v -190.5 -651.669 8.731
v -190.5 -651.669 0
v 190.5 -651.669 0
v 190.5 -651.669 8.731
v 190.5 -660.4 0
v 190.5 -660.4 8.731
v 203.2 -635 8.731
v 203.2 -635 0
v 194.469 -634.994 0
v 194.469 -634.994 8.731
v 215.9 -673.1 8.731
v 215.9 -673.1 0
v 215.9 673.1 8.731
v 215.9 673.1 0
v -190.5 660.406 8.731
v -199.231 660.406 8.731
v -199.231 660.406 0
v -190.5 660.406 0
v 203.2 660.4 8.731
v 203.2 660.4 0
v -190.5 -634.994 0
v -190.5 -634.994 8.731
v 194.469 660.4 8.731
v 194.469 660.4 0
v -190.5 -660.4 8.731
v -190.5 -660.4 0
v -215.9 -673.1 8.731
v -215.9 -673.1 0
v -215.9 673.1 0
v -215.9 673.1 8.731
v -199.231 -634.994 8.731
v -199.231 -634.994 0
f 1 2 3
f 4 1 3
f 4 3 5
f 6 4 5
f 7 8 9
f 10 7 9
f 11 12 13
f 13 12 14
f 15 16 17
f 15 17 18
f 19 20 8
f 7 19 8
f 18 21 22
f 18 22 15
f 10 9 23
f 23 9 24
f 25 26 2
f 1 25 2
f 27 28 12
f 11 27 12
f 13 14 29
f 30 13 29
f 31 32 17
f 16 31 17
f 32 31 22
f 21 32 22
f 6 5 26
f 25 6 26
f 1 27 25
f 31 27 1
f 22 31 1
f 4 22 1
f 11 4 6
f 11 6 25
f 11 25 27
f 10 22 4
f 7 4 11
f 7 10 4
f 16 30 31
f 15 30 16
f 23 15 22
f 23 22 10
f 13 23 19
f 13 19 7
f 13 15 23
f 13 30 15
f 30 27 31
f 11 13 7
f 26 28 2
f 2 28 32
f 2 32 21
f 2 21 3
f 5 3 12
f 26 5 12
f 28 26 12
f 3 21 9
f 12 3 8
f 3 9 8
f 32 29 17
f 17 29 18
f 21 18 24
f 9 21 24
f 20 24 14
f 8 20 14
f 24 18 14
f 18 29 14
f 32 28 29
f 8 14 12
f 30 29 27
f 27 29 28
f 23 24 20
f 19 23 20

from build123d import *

# Parameters (mm, degrees)
F0_W     = 8.73125
F0_H     = 1295.4
F1_DEPTH = 8.73125


with BuildPart() as f1:
    # F0 (on Top) → F1 (new body)
    with BuildSketch(Plane.XY):
        Polygon((215.9, 673.1), (-215.9, 673.1), (-215.9, -673.1), (0, -673.1), (215.9, -673.1), (215.9, 74.258551), align=None)
        Polygon((190.5, -660.4), (0, -660.4), (-190.5, -660.4), (-190.5, -651.66875), (190.5, -651.66875), align=None, mode=Mode.SUBTRACT)
        with Locations((-194.865625, 12.70608)):
            Rectangle(F0_W, F0_H, mode=Mode.SUBTRACT)
        Polygon((203.2, 660.4), (203.2, 74.258551), (203.2, -635), (194.46875, -634.99392), (194.46875, 660.4), align=None, mode=Mode.SUBTRACT)
    extrude(amount=F1_DEPTH)


solid = f1.part
